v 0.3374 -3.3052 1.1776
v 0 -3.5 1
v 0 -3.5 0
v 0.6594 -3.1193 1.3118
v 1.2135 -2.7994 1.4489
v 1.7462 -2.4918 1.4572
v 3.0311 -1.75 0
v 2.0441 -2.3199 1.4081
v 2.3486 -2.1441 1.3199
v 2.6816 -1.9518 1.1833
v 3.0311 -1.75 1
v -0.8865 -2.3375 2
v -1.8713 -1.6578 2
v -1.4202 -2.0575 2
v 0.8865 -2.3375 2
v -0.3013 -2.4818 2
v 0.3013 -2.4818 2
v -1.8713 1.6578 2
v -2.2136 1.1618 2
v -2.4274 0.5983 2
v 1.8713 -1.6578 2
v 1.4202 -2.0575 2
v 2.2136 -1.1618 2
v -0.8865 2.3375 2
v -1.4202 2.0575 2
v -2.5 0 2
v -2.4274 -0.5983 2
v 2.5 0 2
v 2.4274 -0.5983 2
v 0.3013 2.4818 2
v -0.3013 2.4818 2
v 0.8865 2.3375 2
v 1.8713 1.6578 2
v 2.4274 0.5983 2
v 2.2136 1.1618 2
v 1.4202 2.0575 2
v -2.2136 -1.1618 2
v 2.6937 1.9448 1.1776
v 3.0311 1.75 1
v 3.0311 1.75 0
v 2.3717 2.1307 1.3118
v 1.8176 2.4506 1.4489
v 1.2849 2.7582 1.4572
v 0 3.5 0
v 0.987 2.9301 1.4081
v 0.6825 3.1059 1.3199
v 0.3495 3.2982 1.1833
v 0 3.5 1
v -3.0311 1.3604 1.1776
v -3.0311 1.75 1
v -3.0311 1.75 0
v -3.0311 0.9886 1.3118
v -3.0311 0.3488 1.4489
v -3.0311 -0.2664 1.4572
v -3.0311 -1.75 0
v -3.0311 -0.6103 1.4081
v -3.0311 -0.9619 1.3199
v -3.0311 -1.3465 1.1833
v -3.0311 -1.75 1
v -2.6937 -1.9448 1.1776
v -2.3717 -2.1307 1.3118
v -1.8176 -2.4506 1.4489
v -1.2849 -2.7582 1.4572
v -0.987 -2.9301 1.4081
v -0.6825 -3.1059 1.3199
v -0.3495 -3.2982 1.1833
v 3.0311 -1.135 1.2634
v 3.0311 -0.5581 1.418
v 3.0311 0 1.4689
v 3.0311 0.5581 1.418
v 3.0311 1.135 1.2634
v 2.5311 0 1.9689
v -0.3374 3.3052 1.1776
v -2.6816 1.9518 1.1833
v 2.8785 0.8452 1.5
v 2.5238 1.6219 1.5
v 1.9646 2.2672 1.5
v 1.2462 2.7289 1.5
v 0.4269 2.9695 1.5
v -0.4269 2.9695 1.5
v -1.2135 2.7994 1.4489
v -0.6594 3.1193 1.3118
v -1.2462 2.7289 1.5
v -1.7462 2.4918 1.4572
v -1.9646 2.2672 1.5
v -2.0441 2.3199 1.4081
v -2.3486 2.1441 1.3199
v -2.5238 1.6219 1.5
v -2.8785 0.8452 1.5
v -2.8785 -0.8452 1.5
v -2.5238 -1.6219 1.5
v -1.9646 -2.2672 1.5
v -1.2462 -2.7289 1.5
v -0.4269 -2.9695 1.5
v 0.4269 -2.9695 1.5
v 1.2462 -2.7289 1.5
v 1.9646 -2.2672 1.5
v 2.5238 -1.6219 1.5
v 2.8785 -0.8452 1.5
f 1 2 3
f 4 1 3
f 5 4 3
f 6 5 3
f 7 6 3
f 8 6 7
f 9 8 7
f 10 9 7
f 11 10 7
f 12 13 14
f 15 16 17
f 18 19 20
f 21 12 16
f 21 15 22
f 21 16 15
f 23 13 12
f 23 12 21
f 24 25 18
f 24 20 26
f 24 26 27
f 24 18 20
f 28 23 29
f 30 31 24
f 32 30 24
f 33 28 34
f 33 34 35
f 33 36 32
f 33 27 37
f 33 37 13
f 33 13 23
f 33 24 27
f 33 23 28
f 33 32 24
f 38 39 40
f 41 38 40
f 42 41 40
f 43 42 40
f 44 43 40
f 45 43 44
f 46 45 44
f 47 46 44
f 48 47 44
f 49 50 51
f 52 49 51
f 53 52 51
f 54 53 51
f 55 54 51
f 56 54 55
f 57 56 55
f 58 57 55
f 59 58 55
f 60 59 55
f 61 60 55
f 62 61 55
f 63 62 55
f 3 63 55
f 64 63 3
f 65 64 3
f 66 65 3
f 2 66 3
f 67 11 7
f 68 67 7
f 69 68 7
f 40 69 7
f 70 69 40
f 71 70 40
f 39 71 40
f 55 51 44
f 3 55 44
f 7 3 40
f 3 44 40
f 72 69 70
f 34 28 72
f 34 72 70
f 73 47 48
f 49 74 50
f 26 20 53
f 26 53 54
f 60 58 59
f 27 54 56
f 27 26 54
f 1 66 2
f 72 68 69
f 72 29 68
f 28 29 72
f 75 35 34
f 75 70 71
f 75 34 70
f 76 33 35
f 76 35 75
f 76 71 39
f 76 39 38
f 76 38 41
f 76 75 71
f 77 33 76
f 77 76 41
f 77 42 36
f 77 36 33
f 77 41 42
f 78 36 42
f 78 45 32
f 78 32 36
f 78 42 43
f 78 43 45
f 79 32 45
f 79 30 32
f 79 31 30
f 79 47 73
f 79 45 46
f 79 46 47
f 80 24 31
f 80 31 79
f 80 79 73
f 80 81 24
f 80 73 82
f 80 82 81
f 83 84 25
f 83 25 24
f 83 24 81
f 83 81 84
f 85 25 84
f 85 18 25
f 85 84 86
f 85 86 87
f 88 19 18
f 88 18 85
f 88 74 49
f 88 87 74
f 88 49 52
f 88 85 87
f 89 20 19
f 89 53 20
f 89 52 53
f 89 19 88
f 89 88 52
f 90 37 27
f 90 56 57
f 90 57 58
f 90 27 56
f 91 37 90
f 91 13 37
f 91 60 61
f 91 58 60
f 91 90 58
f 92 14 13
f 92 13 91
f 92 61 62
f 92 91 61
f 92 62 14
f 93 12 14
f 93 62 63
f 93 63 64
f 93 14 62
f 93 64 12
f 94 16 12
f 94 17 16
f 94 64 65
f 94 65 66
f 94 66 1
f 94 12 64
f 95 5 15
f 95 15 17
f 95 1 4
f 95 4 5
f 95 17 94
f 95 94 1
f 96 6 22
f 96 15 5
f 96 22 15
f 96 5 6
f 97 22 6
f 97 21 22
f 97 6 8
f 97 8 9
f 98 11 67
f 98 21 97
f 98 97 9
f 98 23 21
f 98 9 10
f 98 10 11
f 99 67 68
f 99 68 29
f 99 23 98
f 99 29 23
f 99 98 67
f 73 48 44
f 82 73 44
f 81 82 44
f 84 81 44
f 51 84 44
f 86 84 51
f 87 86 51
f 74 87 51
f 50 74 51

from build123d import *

# Parameters (mm, degrees)
SKETCH_R          = 3.5
PAD_DEPTH         = 2
CHAMFER_SIZE      = 1
SKETCH001_R       = 4.5
POCKET_DEPTH      = 2.001
POCKET_DEPTH_BACK = 0.001


with BuildPart() as part:
    # Sketch → Pad (new body)
    with BuildSketch(Plane.XY):
        Circle(SKETCH_R)
    extrude(amount=PAD_DEPTH)

    # Chamfer
    chamfer_edges = [part.edges().sort_by_distance(p)[0] for p in [
        (-3.5, 0, 2),
    ]]
    chamfer(chamfer_edges, length=CHAMFER_SIZE)

    # Sketch001 (on Face3 of Pad) → Pocket (cut, two sides)
    with BuildSketch(Plane.XY.offset(2)) as pocket_sk:
        Circle(SKETCH001_R)
        Polygon((3.031089, 1.75), (0, 3.5), (-3.031089, 1.75), (-3.031089, -1.75), (0, -3.5), (3.031089, -1.75), align=None, mode=Mode.SUBTRACT)
    extrude(amount=-POCKET_DEPTH, mode=Mode.SUBTRACT)
    extrude(pocket_sk.sketch, amount=POCKET_DEPTH_BACK, mode=Mode.SUBTRACT)


solid = part.part
